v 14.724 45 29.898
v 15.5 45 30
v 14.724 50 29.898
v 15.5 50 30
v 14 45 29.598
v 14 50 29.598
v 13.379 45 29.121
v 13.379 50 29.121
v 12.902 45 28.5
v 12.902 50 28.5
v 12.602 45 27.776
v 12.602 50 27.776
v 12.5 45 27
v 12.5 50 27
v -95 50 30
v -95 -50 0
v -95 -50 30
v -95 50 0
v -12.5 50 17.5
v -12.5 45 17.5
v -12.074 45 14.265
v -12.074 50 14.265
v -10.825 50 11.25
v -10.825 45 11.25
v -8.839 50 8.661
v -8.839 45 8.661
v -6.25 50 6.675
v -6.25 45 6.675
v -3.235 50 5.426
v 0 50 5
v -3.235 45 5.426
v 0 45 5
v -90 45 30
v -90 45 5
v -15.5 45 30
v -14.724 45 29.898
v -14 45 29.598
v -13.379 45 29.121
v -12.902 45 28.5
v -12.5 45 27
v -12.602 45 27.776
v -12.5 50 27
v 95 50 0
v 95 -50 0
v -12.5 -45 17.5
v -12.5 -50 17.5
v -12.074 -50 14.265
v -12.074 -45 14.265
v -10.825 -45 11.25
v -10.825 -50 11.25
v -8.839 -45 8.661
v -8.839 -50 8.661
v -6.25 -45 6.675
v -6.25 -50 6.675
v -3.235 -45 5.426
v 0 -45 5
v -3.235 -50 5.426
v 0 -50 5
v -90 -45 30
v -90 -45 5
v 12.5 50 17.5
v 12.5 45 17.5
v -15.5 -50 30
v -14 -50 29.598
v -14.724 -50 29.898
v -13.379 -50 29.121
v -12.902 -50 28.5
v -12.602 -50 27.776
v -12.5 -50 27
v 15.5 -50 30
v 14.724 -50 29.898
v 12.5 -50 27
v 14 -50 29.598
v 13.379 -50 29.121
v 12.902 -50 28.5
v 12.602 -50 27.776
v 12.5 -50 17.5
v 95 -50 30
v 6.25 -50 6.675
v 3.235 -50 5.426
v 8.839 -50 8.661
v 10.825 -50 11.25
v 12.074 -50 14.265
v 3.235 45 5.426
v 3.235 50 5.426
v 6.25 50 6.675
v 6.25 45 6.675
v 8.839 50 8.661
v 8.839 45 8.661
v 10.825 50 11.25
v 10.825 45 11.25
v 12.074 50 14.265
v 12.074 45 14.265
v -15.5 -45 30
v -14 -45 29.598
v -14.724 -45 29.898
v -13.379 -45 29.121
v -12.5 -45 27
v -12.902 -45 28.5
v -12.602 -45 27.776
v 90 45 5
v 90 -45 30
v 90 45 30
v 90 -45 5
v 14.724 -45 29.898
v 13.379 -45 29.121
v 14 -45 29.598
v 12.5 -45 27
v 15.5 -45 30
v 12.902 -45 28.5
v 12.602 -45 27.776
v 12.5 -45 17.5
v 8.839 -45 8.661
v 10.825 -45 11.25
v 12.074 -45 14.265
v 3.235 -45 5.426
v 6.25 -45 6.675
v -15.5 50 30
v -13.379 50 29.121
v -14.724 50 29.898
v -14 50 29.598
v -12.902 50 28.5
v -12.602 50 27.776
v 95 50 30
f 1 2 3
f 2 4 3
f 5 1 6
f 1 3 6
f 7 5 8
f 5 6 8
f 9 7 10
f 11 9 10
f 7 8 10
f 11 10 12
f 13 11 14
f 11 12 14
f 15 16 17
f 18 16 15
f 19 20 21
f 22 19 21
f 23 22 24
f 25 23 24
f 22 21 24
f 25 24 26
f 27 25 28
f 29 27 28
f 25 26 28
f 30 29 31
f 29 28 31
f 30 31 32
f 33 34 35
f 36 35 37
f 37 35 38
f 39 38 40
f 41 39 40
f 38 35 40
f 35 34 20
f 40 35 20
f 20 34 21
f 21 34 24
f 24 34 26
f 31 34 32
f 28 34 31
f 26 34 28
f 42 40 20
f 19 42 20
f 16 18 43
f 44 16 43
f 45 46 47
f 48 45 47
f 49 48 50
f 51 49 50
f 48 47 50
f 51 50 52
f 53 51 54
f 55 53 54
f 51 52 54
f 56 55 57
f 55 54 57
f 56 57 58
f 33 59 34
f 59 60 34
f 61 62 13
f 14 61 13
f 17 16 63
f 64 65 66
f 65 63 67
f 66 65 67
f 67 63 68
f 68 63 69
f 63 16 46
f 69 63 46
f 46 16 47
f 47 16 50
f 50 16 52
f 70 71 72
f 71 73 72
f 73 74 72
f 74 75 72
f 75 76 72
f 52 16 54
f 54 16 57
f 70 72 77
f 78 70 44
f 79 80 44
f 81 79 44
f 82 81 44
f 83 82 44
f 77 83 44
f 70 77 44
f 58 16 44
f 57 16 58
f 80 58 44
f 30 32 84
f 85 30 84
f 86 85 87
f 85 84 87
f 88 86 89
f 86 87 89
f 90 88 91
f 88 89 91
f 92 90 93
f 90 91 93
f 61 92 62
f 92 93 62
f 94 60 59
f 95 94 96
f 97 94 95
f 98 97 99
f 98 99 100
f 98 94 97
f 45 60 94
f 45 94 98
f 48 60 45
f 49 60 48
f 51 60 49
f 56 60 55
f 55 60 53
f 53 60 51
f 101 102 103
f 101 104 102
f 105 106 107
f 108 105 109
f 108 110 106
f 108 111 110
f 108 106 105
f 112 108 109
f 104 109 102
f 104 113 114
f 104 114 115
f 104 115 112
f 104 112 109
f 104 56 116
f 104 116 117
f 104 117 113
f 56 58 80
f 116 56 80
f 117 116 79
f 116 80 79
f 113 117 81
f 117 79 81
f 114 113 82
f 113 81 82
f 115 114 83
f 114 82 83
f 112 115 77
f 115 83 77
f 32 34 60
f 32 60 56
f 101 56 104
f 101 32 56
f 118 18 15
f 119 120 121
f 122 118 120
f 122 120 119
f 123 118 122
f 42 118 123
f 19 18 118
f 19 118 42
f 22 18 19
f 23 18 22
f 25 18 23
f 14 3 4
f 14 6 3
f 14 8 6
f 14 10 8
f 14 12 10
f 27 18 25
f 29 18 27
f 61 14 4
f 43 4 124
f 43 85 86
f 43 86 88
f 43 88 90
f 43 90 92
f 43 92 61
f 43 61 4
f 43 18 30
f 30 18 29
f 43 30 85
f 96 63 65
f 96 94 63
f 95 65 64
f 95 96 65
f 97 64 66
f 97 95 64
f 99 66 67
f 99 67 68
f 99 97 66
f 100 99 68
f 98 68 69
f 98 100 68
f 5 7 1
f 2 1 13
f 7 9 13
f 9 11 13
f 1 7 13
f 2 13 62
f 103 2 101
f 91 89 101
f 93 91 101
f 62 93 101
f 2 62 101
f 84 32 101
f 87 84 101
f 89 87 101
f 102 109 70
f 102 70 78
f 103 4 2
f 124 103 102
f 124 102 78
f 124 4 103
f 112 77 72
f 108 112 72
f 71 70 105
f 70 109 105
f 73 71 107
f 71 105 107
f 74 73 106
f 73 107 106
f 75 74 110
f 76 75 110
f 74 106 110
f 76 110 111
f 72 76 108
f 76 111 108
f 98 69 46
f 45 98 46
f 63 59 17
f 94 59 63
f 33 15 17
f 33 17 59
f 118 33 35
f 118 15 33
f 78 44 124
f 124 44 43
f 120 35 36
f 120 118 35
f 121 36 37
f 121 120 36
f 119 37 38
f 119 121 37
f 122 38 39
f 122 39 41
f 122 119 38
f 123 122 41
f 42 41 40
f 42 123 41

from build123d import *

# Parameters (mm, degrees)
F0_W     = 190
F0_H     = 100
F1_DEPTH = 30
F2_T     = -5
F4_DEPTH = 100
F5_R     = 3


with BuildPart() as f1:
    # F0 (on Top) → F1 (new body)
    with BuildSketch(Plane.XY):
        Rectangle(F0_W, F0_H)
    extrude(amount=F1_DEPTH)

    # F2
    f2_openings = [f1.faces().sort_by_distance(p)[0] for p in [
        (0, 0, 30),
    ]]
    offset(amount=F2_T, openings=f2_openings)

    # F3 (on face) → F4 (cut, through all)
    with BuildSketch(Plane.XZ.offset(50)):
        with BuildLine():
            ThreePointArc((-5.1e-08, 5), (8.8388347468, 8.6611652172), (12.5, 17.5))
            Line((12.5, 17.5), (-12.5, 17.5))
            ThreePointArc((-12.5, 17.5), (-8.8388347828, 8.6611652532), (-5.1e-08, 5))
        make_face()
        with BuildLine():
            ThreePointArc((-12.5, 17.5), (-8.8388347699, 26.3388347597), (-1.44e-08, 30))
            Line((-1.44e-08, 30), (-12.5, 30))
            Line((-12.5, 30), (-12.5, 17.5))
        make_face()
        with BuildLine():
            Line((-12.5, 17.5), (12.5, 17.5))
            ThreePointArc((12.5, 17.5), (8.8388347597, 26.3388347699), (-1.44e-08, 30))
            ThreePointArc((-1.44e-08, 30), (-8.8388347699, 26.3388347597), (-12.5, 17.5))
        make_face()
        with BuildLine():
            ThreePointArc((-1.44e-08, 30), (8.8388347597, 26.3388347699), (12.5, 17.5))
            Line((12.5, 17.5), (12.5, 30))
            Line((12.5, 30), (-1.44e-08, 30))
        make_face()
    extrude(amount=-F4_DEPTH, mode=Mode.SUBTRACT)

    # F5
    f5_edges = [f1.edges().sort_by_distance(p)[0] for p in [
        (-12.5, -47.5, 30),
        (12.5, -47.5, 30),
        (-12.5, 47.5, 30),
        (12.5, 47.5, 30),
    ]]
    fillet(f5_edges, radius=F5_R)


solid = f1.part
